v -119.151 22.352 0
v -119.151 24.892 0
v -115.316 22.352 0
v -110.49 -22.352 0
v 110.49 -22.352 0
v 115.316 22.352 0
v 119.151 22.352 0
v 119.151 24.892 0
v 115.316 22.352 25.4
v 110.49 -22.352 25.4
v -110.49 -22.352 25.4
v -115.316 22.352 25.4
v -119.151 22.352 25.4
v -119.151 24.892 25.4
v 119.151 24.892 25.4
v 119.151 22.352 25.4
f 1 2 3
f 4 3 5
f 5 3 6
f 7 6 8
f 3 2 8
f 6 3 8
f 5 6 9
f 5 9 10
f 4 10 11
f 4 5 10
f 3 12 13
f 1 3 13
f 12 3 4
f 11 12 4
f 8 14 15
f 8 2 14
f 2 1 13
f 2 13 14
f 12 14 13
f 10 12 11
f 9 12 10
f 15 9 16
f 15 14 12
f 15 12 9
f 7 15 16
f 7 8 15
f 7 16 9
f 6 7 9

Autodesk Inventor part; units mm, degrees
ref_plane "YZ Plane" through (0, 0, 0) normal (1, 0, 0) x (0, 1, 0)
ref_plane "XZ Plane" through (0, 0, 0) normal (0, 1, 0) x (-1, 0, 0)
ref_plane "XY Plane" through (0, 0, 0) normal (0, 0, 1) x (1, 0, 0)
sketch "Sketch1" plane through (0, 0, 0) normal (0, 0, 1) x (1, 0, 0)
  line L0 (-110.49, 22.352) -> (110.49, 22.352)
  line L1 (110.49, 22.352) -> (110.49, -22.352)
  line L2 (110.49, -22.352) -> (-110.49, -22.352)
  line L3 (-110.49, -22.352) -> (-110.49, 22.352)
  line L4 (-110.49, 22.352) -> (110.49, -22.352) construction
  line L5 (110.49, 22.352) -> (-110.49, -22.352) construction
  line L6 (0, 22.352) -> (115.316, 22.352)
  line L7 (115.316, 22.352) -> (110.49, -22.352)
  line L8 (0, 22.352) -> (-115.316, 22.352)
  line L9 (-115.316, 22.352) -> (-110.49, -22.352)
  line L10 (119.1514, 22.352) -> (-119.1514, 22.352)
  line L11 (-119.1514, 22.352) -> (-119.1514, 24.892)
  line L12 (-119.1514, 24.892) -> (119.1514, 24.892)
  line L13 (119.1514, 24.892) -> (119.1514, 22.352)
  point P0 (0, 0)
  point P1 (0, 24.892)
  point P2 (110.49, 22.352)
  point P3 (-110.49, 22.352)
  point P4 (110.49, 22.352)
  point P5 (-115.316, 22.352)
  point P6 (115.316, 22.352)
  dimension "d0" = 220.98
  dimension "d1" = 44.704
  dimension "d2" = 115.316
  dimension "d3" = 115.316
  dimension "d10" = 2.54
  dimension "d11" = 238.3028
extrude "Extrusion1" add sketch "Sketch1" along normal blind 25.4
sketch "Sketch2" plane through (0, 0, 25.4) normal (0, 0, 1) x (1, 0, 0)
  line L0 (-120.0424, 48.8596) -> (122.5706, 48.8596)
  line L1 (122.5706, 48.8596) -> (122.5706, -0.3726)
  line L2 (122.5706, -0.3726) -> (-120.0424, -0.3726)
  line L3 (-120.0424, -0.3726) -> (-120.0424, 48.8596)
  point P0 (0, 0)
extrude "Extrusion2" [suppressed]
properties part number "Lid_Divider"
